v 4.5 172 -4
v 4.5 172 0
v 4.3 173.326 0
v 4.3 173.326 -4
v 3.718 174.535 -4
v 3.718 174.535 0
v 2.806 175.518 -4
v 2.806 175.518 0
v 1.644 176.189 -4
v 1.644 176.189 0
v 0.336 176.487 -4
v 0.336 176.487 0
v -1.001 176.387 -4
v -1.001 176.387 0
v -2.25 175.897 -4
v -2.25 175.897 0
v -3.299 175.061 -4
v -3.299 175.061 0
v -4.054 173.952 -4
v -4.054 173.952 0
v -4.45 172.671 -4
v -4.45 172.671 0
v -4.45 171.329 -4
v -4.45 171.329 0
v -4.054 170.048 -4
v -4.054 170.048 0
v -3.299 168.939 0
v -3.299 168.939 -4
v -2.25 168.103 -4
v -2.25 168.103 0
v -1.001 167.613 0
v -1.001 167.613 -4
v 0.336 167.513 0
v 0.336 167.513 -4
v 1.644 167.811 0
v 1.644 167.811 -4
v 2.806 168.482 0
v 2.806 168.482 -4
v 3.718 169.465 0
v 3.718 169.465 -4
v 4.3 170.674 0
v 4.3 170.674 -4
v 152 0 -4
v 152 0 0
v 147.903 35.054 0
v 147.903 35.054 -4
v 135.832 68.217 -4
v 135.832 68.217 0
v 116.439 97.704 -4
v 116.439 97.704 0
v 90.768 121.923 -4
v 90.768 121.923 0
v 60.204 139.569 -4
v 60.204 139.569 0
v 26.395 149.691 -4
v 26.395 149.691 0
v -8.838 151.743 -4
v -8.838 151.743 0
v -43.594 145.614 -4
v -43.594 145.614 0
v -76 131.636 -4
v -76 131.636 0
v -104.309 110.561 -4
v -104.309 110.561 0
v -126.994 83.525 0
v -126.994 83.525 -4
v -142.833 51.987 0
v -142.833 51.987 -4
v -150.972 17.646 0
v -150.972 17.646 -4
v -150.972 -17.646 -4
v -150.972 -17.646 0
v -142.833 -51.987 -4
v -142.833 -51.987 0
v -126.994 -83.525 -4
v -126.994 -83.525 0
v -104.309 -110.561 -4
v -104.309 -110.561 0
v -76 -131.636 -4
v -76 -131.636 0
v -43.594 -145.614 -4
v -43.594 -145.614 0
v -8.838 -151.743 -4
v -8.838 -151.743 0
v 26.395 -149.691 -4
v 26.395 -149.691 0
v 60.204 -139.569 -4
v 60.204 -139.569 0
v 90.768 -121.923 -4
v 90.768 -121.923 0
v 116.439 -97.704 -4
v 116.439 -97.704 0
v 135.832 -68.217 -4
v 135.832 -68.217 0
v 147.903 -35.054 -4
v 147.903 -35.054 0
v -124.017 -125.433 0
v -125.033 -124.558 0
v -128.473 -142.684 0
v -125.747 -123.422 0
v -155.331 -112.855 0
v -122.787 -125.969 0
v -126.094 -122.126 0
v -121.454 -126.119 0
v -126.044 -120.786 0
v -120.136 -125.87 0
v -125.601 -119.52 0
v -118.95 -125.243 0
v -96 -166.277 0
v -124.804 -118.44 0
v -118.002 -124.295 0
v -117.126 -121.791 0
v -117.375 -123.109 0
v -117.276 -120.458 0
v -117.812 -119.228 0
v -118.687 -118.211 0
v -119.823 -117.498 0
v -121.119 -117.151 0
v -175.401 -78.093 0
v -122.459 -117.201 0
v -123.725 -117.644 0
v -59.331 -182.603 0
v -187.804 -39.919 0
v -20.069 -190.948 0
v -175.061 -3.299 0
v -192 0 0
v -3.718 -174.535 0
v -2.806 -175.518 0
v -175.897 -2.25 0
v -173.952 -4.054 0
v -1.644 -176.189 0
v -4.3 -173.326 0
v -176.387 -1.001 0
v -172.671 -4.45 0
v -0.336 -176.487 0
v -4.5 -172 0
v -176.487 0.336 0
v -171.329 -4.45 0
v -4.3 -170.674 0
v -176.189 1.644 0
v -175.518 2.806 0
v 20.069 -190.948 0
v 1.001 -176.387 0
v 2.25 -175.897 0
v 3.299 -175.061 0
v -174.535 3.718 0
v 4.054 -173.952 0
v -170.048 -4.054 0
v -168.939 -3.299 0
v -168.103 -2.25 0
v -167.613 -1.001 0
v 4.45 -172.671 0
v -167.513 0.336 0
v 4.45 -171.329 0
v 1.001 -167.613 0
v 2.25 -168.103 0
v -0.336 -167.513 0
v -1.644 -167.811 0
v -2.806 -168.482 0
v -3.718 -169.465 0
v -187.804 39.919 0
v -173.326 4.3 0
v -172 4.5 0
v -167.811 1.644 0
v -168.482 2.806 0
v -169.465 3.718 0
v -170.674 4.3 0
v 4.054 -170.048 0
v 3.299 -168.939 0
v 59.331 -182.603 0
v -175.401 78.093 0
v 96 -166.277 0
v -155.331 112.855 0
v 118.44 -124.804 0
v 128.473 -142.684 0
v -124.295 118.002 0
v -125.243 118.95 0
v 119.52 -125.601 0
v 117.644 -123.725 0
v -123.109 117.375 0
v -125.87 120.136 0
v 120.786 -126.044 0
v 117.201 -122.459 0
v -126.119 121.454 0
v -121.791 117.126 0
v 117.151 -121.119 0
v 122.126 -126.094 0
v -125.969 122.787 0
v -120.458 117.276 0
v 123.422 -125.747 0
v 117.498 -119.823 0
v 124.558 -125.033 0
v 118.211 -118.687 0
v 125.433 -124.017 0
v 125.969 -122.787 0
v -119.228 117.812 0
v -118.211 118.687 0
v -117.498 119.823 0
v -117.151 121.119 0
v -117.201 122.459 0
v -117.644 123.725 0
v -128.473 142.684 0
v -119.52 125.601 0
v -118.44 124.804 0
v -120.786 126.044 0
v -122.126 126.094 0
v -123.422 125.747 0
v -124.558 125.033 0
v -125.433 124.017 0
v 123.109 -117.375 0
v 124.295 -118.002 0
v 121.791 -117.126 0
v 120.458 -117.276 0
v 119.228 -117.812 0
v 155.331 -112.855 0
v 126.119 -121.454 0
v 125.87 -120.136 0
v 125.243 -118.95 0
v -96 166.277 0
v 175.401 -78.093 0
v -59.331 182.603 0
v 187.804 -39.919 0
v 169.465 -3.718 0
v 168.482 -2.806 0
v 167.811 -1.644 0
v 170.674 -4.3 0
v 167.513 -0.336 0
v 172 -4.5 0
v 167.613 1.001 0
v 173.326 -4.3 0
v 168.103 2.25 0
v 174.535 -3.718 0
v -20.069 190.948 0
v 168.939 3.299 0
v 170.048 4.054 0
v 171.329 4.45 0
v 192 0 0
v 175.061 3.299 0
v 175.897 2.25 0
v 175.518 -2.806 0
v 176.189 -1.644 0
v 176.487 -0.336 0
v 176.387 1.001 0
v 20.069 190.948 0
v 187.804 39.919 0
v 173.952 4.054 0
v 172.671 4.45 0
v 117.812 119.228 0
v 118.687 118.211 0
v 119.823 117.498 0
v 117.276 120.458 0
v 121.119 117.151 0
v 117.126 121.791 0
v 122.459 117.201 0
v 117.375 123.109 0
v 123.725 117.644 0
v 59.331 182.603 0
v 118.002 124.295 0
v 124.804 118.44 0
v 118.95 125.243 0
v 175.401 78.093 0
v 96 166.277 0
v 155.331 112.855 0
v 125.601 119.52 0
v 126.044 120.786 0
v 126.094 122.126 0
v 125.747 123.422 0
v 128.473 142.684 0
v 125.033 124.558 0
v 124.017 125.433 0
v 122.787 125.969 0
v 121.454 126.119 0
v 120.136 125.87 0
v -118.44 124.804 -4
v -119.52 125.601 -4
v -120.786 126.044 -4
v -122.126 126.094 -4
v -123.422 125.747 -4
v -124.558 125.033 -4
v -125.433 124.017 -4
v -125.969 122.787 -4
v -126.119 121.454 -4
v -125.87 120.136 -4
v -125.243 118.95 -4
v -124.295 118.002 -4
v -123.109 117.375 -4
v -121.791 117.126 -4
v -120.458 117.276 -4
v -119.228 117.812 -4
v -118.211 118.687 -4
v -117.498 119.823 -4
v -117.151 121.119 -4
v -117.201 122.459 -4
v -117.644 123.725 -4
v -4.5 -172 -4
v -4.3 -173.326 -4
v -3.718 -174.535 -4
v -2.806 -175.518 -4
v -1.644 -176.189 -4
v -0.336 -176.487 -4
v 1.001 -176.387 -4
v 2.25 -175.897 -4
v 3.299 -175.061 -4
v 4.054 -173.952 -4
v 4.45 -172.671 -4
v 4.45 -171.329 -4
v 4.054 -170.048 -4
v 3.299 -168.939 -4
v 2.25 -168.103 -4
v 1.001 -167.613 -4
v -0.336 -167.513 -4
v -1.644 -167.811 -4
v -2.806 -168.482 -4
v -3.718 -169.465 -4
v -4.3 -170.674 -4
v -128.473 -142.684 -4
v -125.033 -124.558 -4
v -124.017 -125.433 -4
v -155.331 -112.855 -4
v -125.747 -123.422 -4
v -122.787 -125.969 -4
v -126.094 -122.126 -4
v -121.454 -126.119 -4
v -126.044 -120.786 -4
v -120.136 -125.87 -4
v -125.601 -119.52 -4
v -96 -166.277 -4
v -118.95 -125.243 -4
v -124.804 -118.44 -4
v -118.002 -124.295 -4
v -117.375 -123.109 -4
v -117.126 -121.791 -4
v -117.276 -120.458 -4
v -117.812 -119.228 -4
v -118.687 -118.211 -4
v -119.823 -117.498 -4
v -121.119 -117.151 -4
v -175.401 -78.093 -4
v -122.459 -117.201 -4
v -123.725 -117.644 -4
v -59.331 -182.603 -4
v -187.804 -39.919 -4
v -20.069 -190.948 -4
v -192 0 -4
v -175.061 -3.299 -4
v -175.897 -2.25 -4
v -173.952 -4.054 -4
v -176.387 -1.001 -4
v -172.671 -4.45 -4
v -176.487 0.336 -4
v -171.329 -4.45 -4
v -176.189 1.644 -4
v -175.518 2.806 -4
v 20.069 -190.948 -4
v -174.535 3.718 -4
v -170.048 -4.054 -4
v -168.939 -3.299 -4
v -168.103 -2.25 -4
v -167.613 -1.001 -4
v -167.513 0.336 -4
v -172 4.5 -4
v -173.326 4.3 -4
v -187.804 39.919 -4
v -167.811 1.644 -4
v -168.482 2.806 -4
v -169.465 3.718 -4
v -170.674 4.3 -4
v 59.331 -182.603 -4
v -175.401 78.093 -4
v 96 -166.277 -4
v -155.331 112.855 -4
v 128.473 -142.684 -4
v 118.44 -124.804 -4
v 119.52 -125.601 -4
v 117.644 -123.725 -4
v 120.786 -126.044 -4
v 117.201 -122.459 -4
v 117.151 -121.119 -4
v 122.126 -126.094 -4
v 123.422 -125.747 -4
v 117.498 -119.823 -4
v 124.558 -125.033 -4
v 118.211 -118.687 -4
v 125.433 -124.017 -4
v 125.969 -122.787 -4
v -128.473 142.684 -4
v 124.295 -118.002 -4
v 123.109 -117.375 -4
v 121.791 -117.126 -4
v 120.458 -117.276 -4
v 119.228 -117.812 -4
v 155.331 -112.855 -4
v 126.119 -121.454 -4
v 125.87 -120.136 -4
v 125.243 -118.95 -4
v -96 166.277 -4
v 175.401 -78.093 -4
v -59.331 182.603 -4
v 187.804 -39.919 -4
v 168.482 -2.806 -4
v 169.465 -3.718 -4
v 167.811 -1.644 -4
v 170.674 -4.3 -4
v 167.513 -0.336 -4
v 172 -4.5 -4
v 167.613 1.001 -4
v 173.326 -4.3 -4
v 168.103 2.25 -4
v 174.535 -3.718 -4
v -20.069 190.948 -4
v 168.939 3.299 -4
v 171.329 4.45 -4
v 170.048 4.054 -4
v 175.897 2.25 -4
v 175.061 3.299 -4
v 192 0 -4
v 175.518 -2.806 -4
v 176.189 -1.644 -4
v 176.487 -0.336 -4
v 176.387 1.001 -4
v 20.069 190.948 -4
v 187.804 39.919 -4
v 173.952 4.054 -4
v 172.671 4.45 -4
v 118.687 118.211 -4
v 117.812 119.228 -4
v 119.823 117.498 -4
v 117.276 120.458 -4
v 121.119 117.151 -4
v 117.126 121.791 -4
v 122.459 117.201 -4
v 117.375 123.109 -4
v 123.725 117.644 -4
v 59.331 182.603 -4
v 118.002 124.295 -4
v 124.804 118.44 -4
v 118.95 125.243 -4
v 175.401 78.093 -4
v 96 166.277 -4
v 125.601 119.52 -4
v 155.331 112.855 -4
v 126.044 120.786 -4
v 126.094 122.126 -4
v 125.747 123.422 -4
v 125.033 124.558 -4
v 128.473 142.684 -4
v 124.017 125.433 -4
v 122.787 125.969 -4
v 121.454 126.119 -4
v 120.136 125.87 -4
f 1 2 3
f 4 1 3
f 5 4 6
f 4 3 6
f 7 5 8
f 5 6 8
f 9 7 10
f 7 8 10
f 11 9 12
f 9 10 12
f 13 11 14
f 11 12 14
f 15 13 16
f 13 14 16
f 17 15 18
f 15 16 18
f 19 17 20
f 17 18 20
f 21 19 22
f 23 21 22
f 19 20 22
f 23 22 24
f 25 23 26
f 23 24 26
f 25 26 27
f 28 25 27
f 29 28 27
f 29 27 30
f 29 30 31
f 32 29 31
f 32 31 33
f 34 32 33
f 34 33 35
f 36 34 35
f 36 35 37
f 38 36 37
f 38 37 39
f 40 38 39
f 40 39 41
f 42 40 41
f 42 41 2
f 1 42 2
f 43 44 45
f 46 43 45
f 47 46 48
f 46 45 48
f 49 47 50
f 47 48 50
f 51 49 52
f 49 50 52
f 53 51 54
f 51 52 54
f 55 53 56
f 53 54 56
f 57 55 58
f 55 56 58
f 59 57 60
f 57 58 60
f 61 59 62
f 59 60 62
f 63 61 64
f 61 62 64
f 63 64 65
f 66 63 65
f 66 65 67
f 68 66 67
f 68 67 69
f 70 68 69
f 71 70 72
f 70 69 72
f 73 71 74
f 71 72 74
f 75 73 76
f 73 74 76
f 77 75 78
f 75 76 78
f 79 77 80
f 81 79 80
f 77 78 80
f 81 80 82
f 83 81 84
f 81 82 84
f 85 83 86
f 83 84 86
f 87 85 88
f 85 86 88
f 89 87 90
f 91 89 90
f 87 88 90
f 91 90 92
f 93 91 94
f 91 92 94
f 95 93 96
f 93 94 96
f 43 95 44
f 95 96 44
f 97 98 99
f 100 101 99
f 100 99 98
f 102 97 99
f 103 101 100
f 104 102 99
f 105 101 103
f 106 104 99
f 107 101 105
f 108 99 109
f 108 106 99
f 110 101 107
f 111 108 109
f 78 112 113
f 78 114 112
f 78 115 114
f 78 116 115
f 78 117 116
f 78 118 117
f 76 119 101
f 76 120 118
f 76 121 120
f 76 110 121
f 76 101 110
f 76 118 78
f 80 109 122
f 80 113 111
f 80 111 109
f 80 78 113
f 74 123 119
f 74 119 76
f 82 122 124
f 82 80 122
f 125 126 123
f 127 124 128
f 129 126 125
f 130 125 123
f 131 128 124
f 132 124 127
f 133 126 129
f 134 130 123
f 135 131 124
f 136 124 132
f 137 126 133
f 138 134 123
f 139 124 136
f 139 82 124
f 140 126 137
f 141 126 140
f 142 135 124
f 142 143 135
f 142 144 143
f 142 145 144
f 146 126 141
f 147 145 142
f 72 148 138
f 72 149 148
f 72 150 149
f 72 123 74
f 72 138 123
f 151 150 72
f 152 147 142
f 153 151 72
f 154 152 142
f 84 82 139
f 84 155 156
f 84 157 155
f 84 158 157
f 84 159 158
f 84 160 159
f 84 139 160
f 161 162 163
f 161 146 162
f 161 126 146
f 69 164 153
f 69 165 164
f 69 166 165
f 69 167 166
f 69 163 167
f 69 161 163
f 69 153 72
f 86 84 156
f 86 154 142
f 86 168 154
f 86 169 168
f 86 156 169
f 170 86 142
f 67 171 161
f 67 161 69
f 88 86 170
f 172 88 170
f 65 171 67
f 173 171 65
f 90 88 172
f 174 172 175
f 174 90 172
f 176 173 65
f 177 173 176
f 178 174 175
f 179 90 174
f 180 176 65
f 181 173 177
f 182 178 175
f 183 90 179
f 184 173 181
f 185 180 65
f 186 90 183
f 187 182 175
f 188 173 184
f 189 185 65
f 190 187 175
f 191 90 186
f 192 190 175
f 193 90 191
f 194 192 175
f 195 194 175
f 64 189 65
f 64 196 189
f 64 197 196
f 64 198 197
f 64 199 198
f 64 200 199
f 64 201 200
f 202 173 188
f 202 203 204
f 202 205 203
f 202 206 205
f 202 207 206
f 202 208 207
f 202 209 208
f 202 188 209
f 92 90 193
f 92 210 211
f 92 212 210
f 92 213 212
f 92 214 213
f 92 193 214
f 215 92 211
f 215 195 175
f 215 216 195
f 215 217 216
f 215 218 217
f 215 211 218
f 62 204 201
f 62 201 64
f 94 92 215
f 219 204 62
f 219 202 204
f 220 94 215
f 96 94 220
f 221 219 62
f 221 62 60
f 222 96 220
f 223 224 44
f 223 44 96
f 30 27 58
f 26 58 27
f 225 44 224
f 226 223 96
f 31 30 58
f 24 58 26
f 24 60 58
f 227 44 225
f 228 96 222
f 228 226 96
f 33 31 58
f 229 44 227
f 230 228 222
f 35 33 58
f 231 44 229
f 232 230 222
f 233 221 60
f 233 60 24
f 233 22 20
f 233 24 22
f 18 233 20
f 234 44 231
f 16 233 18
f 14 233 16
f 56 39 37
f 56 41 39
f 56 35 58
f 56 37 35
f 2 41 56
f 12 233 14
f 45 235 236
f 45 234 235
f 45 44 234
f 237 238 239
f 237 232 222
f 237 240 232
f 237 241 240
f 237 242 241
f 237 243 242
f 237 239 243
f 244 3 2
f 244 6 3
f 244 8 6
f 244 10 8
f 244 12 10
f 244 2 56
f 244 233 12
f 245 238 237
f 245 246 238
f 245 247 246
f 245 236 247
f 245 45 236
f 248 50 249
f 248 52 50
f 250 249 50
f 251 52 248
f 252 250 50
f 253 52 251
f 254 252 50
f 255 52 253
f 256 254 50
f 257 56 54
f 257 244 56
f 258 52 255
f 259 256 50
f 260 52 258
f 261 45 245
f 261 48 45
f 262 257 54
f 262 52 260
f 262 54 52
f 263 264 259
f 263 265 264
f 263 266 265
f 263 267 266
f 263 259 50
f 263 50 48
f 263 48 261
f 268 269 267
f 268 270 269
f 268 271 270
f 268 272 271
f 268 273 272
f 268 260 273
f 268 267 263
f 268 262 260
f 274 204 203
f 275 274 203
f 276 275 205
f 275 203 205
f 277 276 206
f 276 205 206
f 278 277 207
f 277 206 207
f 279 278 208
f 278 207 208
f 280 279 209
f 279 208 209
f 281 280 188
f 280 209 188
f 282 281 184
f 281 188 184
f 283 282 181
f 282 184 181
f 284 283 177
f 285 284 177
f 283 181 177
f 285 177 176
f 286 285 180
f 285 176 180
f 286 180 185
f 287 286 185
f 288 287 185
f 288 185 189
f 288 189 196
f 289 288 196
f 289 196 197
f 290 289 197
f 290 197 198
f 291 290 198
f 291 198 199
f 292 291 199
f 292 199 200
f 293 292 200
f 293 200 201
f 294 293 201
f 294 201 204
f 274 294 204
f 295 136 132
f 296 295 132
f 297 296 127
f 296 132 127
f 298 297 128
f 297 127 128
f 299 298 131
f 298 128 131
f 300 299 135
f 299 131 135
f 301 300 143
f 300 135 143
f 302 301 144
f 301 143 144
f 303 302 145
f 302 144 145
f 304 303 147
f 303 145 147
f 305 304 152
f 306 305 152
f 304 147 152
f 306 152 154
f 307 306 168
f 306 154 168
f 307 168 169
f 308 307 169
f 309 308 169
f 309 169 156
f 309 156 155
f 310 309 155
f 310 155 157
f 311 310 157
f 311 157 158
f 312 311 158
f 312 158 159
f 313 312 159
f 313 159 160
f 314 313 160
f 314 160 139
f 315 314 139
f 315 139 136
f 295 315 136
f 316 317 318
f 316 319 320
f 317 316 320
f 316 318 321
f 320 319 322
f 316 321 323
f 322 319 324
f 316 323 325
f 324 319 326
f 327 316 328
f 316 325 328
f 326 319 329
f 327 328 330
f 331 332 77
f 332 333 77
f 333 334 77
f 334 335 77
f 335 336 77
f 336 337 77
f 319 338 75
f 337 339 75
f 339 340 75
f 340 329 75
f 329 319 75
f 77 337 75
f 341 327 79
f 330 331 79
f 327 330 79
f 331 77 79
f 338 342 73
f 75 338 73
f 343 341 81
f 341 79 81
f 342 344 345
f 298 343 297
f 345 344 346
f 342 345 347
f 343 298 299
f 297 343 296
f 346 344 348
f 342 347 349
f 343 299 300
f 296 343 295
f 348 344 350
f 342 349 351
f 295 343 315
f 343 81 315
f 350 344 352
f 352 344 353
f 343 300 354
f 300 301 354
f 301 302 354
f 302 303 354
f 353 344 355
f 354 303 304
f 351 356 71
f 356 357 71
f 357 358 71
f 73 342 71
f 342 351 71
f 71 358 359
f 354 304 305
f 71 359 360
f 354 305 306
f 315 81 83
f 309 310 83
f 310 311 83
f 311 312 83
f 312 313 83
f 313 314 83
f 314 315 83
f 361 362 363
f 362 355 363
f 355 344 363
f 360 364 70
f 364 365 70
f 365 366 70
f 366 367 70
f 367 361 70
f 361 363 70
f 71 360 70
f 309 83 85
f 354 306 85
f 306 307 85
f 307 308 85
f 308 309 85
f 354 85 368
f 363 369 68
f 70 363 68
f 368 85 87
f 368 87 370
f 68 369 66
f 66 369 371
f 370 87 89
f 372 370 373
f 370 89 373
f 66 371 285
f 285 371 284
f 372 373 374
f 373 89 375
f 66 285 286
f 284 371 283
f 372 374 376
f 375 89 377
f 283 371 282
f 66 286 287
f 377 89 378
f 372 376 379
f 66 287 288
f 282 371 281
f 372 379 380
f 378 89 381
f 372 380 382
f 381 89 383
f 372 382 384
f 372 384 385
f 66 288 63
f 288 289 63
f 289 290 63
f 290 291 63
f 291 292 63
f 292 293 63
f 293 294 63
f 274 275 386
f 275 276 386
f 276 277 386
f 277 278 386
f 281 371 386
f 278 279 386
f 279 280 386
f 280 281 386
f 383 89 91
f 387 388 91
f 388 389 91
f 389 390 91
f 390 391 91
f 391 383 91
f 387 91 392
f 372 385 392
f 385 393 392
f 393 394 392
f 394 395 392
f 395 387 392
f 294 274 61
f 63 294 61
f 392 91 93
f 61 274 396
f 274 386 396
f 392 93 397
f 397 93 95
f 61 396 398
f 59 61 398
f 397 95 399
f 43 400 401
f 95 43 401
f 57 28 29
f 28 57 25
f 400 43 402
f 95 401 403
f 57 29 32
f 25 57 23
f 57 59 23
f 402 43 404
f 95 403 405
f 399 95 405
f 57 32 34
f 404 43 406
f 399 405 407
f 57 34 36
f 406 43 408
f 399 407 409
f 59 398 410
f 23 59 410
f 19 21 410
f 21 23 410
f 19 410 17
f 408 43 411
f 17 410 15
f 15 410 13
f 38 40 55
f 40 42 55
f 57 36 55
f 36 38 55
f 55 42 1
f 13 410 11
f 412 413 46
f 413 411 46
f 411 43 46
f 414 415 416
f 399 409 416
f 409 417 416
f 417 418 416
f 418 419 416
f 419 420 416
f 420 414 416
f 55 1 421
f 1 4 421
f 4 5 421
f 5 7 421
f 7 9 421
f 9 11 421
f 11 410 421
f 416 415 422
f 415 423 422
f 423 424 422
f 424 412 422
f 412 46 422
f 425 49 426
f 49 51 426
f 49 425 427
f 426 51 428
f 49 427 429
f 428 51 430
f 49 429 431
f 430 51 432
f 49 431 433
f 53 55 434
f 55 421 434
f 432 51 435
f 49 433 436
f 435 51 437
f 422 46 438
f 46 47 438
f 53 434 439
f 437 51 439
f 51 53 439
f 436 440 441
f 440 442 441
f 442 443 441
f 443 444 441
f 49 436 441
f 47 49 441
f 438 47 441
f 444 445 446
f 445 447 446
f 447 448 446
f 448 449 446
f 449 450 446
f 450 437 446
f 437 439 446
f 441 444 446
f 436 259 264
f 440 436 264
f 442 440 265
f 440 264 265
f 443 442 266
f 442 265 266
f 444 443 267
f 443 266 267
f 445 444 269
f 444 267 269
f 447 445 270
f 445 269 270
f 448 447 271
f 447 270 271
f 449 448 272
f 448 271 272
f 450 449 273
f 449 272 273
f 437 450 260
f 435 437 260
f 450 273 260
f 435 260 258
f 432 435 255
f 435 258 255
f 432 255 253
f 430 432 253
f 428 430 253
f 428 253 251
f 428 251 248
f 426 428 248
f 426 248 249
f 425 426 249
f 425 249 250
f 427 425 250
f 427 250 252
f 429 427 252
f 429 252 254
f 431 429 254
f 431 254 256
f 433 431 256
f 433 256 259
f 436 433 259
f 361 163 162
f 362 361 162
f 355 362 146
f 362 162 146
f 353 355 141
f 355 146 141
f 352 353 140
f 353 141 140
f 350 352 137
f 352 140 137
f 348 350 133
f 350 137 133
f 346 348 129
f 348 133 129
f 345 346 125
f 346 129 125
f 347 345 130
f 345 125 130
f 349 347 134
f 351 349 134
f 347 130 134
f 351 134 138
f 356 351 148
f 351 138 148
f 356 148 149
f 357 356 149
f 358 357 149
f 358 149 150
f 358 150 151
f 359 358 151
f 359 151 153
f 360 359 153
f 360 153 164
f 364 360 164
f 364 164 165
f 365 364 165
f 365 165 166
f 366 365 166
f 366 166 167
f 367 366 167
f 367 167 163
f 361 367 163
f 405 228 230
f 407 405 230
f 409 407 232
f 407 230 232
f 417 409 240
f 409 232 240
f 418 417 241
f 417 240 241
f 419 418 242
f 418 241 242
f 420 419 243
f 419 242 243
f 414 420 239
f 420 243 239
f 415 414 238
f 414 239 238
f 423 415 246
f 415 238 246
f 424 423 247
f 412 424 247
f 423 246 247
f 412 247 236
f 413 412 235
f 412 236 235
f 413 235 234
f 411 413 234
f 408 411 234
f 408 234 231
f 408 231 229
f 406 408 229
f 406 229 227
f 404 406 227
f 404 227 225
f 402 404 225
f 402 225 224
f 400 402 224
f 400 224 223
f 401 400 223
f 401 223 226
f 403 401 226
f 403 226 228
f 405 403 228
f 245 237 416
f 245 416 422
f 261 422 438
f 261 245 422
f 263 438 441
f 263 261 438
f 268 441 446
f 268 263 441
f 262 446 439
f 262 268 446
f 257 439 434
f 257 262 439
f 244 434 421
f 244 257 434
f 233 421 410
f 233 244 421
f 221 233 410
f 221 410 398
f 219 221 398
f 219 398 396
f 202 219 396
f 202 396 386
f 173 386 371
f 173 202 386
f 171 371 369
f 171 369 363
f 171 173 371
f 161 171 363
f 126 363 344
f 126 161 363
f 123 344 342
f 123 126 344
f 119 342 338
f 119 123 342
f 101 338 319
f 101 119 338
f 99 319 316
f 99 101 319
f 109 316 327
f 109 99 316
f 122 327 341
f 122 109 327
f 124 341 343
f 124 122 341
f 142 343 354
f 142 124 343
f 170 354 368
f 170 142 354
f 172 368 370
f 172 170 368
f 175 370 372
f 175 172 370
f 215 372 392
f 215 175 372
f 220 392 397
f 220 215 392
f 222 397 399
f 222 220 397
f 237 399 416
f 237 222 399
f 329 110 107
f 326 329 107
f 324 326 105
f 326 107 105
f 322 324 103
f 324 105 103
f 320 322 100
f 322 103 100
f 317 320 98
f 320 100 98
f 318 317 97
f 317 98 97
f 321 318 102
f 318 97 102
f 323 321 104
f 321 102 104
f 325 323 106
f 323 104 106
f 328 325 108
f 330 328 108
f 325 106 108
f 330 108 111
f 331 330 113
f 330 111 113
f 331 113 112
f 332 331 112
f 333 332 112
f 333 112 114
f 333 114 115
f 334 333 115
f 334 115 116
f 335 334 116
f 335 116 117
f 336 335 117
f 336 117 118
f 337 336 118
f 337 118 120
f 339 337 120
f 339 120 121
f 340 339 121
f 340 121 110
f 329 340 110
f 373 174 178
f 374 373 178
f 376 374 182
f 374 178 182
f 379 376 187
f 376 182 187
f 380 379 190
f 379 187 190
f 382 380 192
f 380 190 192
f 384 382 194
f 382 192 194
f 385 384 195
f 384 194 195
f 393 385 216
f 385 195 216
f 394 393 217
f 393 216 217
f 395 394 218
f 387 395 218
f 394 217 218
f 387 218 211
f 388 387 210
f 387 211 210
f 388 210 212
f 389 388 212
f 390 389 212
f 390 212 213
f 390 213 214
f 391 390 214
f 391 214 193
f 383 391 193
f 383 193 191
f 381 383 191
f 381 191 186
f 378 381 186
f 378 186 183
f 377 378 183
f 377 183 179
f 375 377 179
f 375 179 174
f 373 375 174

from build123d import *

# Parameters (mm, degrees)
SKETCH1_R          = 192
SKETCH1_R_2        = 152
BASE_FLANGE1_DEPTH = 4
SKETCH2_R          = 4.5
CUT_EXTRUDE1_DEPTH = 10
CIRPATTERN1_COUNT  = 8


# Sheet-metal steps are written as plain solids
with BuildPart() as part:
    # Sketch1 → Base-Flange1 (new body)
    with BuildSketch(Plane.XY):
        Circle(SKETCH1_R)
        Circle(SKETCH1_R_2, mode=Mode.SUBTRACT)
    extrude(amount=-BASE_FLANGE1_DEPTH)

    # Sketch2 → Cut-Extrude1 (cut)
    with BuildSketch(Plane.XY):
        with Locations((0, 172)):
            Circle(SKETCH2_R)
    cut_extrude1 = extrude(amount=-CUT_EXTRUDE1_DEPTH, mode=Mode.SUBTRACT)

    # CirPattern1: Cut-Extrude1 ×8 about axis
    cirpattern1_axis = Axis((0, 0, 0), (0, 0, 1))
    for i in range(1, CIRPATTERN1_COUNT):
        add(cut_extrude1.rotate(cirpattern1_axis, i * 360 / CIRPATTERN1_COUNT), mode=Mode.SUBTRACT)


solid = part.part
